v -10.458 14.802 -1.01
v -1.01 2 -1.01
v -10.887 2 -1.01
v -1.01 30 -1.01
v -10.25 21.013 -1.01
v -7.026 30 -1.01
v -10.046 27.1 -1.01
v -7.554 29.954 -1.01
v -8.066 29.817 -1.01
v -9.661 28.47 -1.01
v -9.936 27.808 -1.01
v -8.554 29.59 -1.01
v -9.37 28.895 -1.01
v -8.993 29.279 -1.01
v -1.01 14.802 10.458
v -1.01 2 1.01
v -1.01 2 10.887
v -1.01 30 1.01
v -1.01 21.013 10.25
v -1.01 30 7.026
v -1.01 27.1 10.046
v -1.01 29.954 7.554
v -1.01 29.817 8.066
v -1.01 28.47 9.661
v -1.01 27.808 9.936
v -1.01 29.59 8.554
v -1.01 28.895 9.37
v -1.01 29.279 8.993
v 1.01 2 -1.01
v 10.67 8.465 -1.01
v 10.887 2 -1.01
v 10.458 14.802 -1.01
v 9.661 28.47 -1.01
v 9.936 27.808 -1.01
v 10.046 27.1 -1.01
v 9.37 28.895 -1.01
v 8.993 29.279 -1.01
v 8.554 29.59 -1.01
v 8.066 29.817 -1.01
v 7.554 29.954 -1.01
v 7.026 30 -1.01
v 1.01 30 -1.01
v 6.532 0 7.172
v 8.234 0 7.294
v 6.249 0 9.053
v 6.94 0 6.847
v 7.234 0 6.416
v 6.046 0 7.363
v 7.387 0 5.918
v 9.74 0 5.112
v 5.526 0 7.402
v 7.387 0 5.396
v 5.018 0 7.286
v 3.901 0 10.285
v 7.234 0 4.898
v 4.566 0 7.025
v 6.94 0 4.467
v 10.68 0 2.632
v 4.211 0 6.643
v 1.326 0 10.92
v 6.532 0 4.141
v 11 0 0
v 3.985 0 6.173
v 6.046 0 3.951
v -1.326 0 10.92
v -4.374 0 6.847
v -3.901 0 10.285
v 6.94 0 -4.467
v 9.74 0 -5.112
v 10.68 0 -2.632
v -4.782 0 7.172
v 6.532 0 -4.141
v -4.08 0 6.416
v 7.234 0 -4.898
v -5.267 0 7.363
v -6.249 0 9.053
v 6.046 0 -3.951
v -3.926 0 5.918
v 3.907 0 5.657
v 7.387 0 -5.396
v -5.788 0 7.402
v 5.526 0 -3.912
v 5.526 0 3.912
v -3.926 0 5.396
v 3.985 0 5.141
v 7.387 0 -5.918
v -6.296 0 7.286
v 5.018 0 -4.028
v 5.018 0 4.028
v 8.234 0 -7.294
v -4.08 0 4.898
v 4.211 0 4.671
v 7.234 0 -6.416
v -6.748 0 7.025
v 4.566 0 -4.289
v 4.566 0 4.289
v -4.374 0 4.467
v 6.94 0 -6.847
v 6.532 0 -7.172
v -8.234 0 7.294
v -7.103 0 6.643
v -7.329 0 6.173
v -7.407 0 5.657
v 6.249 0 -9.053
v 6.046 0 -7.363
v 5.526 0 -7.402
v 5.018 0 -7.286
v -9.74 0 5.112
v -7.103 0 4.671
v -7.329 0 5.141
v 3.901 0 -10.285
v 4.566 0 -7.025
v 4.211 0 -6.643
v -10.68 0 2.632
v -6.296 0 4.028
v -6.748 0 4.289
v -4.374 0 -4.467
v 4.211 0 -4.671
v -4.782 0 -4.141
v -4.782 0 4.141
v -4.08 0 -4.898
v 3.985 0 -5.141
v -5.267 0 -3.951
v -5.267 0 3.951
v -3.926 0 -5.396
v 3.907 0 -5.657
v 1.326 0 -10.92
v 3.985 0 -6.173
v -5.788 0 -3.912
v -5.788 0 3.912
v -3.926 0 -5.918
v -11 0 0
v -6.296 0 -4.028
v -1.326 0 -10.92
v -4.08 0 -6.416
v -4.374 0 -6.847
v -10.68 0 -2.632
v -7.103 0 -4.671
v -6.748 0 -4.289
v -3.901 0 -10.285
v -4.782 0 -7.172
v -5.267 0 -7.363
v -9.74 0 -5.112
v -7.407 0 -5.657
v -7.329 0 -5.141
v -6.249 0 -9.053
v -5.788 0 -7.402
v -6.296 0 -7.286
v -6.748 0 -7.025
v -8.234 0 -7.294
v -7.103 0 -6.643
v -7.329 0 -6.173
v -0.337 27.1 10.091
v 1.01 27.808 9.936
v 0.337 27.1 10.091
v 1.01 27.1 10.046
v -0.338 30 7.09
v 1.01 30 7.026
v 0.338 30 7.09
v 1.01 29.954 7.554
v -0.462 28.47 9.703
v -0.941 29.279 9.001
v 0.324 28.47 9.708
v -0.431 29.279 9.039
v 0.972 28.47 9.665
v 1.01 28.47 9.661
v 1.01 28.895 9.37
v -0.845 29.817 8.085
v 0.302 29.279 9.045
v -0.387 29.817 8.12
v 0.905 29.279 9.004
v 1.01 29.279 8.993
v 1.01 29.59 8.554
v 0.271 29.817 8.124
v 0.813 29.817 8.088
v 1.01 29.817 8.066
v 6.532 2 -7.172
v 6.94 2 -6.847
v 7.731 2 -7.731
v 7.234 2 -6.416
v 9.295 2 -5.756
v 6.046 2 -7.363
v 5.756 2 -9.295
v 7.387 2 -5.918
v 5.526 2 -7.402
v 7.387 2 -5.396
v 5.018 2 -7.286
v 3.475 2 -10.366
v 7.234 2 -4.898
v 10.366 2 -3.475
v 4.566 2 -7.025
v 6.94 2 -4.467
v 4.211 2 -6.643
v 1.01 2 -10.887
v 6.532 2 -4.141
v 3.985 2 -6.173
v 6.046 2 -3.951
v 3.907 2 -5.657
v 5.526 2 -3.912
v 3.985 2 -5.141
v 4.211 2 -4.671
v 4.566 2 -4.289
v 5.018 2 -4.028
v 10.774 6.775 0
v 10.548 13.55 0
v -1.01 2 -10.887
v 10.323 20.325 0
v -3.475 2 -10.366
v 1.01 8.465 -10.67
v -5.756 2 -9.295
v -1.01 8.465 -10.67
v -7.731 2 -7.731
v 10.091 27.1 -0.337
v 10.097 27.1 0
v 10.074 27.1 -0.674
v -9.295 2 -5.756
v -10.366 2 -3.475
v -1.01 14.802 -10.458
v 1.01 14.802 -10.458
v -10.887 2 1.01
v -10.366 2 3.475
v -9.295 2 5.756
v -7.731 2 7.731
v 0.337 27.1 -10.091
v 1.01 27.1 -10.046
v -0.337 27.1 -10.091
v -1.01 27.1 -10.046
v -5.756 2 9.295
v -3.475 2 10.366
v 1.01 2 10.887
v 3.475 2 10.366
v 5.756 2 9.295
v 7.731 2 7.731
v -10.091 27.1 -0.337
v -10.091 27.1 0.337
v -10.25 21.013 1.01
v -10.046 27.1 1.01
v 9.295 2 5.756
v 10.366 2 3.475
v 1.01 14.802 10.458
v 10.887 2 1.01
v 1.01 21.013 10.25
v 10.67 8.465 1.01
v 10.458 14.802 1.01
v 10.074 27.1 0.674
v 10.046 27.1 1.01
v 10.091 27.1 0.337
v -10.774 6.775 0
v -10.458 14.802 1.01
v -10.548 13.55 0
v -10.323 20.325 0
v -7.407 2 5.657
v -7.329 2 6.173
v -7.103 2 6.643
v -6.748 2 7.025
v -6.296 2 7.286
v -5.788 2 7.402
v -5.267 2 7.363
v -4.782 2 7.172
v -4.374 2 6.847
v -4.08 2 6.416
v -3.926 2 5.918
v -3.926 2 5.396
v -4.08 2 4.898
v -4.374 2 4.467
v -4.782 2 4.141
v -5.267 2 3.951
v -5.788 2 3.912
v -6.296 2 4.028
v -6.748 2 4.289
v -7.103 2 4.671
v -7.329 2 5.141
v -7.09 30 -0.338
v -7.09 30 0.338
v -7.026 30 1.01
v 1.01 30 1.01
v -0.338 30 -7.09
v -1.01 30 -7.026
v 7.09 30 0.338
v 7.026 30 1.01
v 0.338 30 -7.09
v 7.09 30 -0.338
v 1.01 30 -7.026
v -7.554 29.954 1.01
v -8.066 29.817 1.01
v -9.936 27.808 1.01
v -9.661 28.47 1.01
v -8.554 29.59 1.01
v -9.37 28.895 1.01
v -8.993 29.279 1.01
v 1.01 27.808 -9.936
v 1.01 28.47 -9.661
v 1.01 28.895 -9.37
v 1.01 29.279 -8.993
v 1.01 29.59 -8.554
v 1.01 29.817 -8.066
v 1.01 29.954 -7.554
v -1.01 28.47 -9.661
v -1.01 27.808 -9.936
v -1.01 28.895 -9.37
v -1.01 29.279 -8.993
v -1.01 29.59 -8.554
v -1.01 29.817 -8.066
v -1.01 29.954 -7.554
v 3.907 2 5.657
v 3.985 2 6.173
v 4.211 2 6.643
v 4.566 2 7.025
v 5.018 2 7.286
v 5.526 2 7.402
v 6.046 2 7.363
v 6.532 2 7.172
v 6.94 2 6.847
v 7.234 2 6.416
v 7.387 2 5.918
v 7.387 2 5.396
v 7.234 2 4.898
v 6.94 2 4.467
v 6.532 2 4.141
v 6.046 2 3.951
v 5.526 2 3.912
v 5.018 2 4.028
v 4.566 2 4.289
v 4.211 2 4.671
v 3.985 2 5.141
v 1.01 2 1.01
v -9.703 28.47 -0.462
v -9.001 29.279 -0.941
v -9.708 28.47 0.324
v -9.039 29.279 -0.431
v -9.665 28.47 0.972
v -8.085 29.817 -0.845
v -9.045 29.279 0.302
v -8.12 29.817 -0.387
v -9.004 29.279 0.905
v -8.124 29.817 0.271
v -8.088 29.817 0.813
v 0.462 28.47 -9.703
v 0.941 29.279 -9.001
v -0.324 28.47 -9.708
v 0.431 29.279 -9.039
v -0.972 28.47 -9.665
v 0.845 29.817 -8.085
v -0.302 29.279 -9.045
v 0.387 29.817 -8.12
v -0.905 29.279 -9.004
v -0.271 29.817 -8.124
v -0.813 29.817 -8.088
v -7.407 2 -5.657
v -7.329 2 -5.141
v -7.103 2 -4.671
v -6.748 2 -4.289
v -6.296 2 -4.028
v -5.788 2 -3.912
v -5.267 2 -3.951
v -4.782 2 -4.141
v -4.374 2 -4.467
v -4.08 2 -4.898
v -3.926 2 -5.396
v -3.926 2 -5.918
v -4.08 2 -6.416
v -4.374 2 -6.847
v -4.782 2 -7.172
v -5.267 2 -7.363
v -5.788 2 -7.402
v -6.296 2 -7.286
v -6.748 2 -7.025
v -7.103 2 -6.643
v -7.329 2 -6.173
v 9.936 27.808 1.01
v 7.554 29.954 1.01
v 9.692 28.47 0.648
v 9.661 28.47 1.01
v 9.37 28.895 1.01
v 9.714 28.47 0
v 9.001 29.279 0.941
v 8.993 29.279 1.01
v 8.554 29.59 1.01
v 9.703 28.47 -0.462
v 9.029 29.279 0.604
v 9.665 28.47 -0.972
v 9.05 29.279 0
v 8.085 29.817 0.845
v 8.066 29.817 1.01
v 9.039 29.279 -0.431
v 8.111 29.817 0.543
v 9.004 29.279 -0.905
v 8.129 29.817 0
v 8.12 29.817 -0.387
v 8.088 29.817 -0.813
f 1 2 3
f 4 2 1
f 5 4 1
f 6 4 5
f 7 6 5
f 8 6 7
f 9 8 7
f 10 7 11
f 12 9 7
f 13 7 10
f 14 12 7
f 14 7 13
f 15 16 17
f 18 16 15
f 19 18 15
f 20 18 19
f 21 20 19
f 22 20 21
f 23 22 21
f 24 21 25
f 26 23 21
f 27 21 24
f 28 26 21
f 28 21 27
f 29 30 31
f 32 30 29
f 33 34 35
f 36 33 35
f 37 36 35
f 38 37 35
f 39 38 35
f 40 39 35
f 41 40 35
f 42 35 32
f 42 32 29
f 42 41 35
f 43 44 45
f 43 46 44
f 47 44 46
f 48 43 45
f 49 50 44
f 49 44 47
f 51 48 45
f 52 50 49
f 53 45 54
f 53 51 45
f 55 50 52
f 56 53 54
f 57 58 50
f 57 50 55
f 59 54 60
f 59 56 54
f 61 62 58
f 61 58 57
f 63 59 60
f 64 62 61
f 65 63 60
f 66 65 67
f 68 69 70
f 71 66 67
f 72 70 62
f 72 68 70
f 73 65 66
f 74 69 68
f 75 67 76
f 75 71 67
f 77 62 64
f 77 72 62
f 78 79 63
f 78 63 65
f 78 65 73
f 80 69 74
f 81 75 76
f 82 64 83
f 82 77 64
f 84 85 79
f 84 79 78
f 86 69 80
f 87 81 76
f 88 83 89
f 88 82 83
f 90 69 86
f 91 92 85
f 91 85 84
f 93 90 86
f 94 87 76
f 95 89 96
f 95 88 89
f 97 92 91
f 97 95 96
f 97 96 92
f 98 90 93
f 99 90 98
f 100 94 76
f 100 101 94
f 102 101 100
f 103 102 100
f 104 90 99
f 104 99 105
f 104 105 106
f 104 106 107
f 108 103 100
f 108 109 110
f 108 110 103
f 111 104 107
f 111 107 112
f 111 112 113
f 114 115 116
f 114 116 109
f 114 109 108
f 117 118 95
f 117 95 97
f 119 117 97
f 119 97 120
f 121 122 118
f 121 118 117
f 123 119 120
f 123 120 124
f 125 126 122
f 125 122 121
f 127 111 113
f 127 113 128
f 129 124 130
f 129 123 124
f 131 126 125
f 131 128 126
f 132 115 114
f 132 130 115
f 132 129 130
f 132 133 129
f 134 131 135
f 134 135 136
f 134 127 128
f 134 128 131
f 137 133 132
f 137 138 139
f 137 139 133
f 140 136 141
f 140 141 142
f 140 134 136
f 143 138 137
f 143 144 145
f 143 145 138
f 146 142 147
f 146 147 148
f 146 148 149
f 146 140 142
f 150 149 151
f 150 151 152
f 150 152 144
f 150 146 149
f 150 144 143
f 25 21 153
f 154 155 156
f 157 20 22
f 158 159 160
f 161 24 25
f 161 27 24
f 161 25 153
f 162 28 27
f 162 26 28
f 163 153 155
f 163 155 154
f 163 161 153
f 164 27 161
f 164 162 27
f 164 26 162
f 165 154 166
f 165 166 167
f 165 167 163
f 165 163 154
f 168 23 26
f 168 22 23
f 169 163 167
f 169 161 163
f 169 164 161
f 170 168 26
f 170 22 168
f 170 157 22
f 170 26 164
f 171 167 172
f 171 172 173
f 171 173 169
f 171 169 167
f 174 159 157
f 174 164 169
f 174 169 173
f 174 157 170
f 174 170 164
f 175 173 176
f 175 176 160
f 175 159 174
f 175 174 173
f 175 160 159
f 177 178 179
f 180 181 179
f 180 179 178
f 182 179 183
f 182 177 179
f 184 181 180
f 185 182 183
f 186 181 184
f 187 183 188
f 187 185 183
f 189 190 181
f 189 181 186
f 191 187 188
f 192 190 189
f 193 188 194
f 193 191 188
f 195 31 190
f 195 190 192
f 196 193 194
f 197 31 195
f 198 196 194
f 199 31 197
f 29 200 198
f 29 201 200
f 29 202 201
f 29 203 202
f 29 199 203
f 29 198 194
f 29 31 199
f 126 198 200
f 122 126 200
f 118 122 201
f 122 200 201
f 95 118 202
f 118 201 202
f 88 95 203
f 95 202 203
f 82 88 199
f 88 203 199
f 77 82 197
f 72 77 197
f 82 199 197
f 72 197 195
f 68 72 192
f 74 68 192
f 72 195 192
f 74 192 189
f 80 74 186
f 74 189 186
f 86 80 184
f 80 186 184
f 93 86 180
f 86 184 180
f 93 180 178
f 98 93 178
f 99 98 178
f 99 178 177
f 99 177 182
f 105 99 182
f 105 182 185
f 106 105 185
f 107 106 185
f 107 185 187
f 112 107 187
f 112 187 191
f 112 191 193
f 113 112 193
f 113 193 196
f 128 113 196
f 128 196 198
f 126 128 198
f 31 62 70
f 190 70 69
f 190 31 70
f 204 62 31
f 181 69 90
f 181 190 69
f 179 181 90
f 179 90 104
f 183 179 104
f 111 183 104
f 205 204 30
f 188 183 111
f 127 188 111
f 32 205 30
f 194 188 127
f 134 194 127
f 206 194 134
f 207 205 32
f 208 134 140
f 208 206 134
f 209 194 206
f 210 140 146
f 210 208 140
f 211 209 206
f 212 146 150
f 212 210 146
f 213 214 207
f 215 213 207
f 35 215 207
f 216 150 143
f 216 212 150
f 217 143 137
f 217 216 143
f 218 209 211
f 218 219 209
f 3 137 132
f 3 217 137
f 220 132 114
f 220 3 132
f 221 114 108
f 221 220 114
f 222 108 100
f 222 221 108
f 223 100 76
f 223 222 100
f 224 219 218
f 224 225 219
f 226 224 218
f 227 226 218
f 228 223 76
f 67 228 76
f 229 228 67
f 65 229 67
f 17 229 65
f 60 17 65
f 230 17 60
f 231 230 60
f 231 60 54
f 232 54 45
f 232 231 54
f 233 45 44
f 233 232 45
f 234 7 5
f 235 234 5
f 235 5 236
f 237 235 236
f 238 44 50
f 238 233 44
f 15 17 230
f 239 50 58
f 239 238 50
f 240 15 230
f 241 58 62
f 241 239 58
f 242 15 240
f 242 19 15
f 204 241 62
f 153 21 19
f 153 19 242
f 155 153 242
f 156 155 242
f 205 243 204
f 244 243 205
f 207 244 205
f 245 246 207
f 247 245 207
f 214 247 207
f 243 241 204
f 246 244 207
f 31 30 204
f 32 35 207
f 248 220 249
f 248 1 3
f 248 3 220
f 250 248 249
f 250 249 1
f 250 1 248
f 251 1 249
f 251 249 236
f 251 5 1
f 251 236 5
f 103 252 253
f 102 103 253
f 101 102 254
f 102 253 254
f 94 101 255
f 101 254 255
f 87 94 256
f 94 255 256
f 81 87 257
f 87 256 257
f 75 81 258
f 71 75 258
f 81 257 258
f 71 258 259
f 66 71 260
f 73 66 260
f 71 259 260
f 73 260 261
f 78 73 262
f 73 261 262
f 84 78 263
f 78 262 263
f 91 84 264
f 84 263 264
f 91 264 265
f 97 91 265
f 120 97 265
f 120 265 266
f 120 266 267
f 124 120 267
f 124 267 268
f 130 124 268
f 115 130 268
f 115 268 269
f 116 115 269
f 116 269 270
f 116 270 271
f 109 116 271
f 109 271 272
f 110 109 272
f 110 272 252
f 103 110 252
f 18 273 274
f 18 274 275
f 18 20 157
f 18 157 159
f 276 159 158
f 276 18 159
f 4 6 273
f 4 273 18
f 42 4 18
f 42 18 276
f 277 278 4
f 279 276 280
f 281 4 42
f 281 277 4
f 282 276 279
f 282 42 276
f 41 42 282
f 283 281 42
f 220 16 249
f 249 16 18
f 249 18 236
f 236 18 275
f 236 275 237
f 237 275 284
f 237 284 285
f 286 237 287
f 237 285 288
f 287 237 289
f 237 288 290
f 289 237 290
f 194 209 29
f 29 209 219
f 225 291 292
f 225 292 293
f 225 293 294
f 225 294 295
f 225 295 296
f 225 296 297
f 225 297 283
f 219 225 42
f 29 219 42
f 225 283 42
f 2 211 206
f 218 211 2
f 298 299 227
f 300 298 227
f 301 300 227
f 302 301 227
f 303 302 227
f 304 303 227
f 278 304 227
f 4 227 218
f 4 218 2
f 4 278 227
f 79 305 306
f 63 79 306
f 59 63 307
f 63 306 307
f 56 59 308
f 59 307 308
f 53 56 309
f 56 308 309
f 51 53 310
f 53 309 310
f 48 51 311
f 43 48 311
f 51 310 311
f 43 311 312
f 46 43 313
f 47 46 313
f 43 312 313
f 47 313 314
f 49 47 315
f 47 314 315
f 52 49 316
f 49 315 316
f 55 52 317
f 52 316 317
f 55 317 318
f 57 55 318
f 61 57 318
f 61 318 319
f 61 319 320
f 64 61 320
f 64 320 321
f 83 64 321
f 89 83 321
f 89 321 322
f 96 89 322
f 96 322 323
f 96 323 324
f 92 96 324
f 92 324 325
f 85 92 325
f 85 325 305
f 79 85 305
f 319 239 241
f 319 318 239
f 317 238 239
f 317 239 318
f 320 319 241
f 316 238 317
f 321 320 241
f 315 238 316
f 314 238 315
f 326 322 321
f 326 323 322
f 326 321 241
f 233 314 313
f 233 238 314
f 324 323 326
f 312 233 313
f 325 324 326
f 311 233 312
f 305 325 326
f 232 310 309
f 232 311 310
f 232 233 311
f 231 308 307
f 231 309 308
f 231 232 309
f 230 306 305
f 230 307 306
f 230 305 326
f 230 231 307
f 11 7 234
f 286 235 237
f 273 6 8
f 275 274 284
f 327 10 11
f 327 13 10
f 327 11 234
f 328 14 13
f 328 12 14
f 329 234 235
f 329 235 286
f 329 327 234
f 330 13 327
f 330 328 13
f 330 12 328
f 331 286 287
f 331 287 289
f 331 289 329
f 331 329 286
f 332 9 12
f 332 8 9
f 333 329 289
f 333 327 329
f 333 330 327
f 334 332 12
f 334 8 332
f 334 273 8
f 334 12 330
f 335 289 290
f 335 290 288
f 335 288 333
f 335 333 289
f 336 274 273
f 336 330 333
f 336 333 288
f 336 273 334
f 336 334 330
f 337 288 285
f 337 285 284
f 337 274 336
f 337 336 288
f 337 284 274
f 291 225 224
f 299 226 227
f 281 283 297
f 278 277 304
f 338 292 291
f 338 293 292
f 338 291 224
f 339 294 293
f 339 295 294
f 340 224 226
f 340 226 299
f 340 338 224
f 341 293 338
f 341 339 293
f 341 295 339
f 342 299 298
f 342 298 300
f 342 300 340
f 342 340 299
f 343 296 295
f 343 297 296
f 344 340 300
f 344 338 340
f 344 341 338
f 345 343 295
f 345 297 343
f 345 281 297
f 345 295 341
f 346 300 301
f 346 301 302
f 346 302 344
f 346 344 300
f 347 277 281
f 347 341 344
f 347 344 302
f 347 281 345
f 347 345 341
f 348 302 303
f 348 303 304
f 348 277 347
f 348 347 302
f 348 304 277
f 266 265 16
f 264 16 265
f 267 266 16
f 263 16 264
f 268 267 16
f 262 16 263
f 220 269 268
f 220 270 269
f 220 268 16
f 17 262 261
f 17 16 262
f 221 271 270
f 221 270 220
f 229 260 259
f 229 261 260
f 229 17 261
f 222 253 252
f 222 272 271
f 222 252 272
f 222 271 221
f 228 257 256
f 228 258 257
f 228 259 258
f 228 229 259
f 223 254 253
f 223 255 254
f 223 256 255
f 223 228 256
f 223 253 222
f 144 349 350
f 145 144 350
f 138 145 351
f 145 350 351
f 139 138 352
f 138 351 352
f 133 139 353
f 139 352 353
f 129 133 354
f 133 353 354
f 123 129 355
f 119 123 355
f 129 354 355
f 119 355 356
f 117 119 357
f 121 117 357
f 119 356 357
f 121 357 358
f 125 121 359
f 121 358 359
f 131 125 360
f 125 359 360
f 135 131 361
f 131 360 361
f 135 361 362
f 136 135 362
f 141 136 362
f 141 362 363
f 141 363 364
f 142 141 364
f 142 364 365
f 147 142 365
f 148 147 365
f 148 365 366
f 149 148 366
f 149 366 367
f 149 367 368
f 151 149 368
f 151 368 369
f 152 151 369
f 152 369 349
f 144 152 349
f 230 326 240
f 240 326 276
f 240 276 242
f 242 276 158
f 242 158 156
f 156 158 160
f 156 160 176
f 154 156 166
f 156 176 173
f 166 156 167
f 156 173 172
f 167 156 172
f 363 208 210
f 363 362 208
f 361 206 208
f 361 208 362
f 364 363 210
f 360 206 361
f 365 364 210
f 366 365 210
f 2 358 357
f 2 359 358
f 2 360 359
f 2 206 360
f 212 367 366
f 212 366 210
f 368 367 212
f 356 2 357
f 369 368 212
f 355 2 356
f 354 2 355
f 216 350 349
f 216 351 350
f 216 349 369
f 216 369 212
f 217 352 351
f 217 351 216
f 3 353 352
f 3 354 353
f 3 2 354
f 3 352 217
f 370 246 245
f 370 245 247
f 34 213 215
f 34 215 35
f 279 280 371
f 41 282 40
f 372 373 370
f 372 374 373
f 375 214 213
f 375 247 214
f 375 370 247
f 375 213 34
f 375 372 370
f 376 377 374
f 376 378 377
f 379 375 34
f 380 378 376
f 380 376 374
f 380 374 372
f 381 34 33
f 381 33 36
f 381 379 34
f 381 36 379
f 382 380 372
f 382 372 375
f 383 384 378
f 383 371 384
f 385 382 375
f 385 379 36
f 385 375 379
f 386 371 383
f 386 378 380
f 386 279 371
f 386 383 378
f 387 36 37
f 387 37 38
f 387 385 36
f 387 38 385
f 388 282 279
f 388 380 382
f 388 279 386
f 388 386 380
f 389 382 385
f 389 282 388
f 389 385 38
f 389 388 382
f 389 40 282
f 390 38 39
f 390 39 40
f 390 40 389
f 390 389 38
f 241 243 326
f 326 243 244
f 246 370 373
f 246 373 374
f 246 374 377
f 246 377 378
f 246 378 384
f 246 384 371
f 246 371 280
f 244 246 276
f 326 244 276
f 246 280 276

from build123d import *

# Parameters (mm, degrees)
F2_W     = 20
F2_H     = 18.99
F3_DEPTH = 28
F4_R     = 3
F5_R     = 1.75
F6_DEPTH = 25


with BuildPart() as f1:
    # F0 (on Top) → F1 (revolve)
    with BuildSketch(Plane.XY):
        Polygon((0, 30), (0, 0), (11, 0), (10, 30), align=None)
    revolve(axis=Axis((0, 15, 0), (0, 1, 0)))

    # F2 (on face) → F3 (cut, through all)
    with BuildSketch(Plane(origin=(0, 30, 0), x_dir=(-1, 0, 0), z_dir=(0, 1, 0))):
        with Locations((11.01, 10.505)):
            Rectangle(F2_W, F2_H)
        with Locations((-11.01, 10.505)):
            Rectangle(F2_W, F2_H)
        with Locations((11.01, -10.505)):
            Rectangle(F2_W, F2_H)
        with Locations((-11.01, -10.505)):
            Rectangle(F2_W, F2_H)
    extrude(amount=-F3_DEPTH, mode=Mode.SUBTRACT)

    # F4
    f4_edges = [f1.edges().sort_by_distance(p)[0] for p in [
        (9.987208, 30, 0.505647),
        (0, 30, 10),
        (-10, 30, 0),
        (0, 30, -10),
    ]]
    fillet(f4_edges, radius=F4_R)

    # F5 (on face) → F6 (cut)
    with BuildSketch(Plane(origin=(0, 2, 0), x_dir=(-1, 0, 0), z_dir=(0, 1, 0))):
        with Locations((-5.6568542495, 5.6568542495)):
            Circle(F5_R)
        with Locations((5.6568542495, -5.6568542495)):
            Circle(F5_R)
        with Locations((-5.6568542495, -5.6568542495)):
            Circle(F5_R)
        with Locations((5.6568542495, 5.6568542495)):
            Circle(F5_R)
    extrude(amount=-F6_DEPTH, mode=Mode.SUBTRACT)


solid = f1.part
